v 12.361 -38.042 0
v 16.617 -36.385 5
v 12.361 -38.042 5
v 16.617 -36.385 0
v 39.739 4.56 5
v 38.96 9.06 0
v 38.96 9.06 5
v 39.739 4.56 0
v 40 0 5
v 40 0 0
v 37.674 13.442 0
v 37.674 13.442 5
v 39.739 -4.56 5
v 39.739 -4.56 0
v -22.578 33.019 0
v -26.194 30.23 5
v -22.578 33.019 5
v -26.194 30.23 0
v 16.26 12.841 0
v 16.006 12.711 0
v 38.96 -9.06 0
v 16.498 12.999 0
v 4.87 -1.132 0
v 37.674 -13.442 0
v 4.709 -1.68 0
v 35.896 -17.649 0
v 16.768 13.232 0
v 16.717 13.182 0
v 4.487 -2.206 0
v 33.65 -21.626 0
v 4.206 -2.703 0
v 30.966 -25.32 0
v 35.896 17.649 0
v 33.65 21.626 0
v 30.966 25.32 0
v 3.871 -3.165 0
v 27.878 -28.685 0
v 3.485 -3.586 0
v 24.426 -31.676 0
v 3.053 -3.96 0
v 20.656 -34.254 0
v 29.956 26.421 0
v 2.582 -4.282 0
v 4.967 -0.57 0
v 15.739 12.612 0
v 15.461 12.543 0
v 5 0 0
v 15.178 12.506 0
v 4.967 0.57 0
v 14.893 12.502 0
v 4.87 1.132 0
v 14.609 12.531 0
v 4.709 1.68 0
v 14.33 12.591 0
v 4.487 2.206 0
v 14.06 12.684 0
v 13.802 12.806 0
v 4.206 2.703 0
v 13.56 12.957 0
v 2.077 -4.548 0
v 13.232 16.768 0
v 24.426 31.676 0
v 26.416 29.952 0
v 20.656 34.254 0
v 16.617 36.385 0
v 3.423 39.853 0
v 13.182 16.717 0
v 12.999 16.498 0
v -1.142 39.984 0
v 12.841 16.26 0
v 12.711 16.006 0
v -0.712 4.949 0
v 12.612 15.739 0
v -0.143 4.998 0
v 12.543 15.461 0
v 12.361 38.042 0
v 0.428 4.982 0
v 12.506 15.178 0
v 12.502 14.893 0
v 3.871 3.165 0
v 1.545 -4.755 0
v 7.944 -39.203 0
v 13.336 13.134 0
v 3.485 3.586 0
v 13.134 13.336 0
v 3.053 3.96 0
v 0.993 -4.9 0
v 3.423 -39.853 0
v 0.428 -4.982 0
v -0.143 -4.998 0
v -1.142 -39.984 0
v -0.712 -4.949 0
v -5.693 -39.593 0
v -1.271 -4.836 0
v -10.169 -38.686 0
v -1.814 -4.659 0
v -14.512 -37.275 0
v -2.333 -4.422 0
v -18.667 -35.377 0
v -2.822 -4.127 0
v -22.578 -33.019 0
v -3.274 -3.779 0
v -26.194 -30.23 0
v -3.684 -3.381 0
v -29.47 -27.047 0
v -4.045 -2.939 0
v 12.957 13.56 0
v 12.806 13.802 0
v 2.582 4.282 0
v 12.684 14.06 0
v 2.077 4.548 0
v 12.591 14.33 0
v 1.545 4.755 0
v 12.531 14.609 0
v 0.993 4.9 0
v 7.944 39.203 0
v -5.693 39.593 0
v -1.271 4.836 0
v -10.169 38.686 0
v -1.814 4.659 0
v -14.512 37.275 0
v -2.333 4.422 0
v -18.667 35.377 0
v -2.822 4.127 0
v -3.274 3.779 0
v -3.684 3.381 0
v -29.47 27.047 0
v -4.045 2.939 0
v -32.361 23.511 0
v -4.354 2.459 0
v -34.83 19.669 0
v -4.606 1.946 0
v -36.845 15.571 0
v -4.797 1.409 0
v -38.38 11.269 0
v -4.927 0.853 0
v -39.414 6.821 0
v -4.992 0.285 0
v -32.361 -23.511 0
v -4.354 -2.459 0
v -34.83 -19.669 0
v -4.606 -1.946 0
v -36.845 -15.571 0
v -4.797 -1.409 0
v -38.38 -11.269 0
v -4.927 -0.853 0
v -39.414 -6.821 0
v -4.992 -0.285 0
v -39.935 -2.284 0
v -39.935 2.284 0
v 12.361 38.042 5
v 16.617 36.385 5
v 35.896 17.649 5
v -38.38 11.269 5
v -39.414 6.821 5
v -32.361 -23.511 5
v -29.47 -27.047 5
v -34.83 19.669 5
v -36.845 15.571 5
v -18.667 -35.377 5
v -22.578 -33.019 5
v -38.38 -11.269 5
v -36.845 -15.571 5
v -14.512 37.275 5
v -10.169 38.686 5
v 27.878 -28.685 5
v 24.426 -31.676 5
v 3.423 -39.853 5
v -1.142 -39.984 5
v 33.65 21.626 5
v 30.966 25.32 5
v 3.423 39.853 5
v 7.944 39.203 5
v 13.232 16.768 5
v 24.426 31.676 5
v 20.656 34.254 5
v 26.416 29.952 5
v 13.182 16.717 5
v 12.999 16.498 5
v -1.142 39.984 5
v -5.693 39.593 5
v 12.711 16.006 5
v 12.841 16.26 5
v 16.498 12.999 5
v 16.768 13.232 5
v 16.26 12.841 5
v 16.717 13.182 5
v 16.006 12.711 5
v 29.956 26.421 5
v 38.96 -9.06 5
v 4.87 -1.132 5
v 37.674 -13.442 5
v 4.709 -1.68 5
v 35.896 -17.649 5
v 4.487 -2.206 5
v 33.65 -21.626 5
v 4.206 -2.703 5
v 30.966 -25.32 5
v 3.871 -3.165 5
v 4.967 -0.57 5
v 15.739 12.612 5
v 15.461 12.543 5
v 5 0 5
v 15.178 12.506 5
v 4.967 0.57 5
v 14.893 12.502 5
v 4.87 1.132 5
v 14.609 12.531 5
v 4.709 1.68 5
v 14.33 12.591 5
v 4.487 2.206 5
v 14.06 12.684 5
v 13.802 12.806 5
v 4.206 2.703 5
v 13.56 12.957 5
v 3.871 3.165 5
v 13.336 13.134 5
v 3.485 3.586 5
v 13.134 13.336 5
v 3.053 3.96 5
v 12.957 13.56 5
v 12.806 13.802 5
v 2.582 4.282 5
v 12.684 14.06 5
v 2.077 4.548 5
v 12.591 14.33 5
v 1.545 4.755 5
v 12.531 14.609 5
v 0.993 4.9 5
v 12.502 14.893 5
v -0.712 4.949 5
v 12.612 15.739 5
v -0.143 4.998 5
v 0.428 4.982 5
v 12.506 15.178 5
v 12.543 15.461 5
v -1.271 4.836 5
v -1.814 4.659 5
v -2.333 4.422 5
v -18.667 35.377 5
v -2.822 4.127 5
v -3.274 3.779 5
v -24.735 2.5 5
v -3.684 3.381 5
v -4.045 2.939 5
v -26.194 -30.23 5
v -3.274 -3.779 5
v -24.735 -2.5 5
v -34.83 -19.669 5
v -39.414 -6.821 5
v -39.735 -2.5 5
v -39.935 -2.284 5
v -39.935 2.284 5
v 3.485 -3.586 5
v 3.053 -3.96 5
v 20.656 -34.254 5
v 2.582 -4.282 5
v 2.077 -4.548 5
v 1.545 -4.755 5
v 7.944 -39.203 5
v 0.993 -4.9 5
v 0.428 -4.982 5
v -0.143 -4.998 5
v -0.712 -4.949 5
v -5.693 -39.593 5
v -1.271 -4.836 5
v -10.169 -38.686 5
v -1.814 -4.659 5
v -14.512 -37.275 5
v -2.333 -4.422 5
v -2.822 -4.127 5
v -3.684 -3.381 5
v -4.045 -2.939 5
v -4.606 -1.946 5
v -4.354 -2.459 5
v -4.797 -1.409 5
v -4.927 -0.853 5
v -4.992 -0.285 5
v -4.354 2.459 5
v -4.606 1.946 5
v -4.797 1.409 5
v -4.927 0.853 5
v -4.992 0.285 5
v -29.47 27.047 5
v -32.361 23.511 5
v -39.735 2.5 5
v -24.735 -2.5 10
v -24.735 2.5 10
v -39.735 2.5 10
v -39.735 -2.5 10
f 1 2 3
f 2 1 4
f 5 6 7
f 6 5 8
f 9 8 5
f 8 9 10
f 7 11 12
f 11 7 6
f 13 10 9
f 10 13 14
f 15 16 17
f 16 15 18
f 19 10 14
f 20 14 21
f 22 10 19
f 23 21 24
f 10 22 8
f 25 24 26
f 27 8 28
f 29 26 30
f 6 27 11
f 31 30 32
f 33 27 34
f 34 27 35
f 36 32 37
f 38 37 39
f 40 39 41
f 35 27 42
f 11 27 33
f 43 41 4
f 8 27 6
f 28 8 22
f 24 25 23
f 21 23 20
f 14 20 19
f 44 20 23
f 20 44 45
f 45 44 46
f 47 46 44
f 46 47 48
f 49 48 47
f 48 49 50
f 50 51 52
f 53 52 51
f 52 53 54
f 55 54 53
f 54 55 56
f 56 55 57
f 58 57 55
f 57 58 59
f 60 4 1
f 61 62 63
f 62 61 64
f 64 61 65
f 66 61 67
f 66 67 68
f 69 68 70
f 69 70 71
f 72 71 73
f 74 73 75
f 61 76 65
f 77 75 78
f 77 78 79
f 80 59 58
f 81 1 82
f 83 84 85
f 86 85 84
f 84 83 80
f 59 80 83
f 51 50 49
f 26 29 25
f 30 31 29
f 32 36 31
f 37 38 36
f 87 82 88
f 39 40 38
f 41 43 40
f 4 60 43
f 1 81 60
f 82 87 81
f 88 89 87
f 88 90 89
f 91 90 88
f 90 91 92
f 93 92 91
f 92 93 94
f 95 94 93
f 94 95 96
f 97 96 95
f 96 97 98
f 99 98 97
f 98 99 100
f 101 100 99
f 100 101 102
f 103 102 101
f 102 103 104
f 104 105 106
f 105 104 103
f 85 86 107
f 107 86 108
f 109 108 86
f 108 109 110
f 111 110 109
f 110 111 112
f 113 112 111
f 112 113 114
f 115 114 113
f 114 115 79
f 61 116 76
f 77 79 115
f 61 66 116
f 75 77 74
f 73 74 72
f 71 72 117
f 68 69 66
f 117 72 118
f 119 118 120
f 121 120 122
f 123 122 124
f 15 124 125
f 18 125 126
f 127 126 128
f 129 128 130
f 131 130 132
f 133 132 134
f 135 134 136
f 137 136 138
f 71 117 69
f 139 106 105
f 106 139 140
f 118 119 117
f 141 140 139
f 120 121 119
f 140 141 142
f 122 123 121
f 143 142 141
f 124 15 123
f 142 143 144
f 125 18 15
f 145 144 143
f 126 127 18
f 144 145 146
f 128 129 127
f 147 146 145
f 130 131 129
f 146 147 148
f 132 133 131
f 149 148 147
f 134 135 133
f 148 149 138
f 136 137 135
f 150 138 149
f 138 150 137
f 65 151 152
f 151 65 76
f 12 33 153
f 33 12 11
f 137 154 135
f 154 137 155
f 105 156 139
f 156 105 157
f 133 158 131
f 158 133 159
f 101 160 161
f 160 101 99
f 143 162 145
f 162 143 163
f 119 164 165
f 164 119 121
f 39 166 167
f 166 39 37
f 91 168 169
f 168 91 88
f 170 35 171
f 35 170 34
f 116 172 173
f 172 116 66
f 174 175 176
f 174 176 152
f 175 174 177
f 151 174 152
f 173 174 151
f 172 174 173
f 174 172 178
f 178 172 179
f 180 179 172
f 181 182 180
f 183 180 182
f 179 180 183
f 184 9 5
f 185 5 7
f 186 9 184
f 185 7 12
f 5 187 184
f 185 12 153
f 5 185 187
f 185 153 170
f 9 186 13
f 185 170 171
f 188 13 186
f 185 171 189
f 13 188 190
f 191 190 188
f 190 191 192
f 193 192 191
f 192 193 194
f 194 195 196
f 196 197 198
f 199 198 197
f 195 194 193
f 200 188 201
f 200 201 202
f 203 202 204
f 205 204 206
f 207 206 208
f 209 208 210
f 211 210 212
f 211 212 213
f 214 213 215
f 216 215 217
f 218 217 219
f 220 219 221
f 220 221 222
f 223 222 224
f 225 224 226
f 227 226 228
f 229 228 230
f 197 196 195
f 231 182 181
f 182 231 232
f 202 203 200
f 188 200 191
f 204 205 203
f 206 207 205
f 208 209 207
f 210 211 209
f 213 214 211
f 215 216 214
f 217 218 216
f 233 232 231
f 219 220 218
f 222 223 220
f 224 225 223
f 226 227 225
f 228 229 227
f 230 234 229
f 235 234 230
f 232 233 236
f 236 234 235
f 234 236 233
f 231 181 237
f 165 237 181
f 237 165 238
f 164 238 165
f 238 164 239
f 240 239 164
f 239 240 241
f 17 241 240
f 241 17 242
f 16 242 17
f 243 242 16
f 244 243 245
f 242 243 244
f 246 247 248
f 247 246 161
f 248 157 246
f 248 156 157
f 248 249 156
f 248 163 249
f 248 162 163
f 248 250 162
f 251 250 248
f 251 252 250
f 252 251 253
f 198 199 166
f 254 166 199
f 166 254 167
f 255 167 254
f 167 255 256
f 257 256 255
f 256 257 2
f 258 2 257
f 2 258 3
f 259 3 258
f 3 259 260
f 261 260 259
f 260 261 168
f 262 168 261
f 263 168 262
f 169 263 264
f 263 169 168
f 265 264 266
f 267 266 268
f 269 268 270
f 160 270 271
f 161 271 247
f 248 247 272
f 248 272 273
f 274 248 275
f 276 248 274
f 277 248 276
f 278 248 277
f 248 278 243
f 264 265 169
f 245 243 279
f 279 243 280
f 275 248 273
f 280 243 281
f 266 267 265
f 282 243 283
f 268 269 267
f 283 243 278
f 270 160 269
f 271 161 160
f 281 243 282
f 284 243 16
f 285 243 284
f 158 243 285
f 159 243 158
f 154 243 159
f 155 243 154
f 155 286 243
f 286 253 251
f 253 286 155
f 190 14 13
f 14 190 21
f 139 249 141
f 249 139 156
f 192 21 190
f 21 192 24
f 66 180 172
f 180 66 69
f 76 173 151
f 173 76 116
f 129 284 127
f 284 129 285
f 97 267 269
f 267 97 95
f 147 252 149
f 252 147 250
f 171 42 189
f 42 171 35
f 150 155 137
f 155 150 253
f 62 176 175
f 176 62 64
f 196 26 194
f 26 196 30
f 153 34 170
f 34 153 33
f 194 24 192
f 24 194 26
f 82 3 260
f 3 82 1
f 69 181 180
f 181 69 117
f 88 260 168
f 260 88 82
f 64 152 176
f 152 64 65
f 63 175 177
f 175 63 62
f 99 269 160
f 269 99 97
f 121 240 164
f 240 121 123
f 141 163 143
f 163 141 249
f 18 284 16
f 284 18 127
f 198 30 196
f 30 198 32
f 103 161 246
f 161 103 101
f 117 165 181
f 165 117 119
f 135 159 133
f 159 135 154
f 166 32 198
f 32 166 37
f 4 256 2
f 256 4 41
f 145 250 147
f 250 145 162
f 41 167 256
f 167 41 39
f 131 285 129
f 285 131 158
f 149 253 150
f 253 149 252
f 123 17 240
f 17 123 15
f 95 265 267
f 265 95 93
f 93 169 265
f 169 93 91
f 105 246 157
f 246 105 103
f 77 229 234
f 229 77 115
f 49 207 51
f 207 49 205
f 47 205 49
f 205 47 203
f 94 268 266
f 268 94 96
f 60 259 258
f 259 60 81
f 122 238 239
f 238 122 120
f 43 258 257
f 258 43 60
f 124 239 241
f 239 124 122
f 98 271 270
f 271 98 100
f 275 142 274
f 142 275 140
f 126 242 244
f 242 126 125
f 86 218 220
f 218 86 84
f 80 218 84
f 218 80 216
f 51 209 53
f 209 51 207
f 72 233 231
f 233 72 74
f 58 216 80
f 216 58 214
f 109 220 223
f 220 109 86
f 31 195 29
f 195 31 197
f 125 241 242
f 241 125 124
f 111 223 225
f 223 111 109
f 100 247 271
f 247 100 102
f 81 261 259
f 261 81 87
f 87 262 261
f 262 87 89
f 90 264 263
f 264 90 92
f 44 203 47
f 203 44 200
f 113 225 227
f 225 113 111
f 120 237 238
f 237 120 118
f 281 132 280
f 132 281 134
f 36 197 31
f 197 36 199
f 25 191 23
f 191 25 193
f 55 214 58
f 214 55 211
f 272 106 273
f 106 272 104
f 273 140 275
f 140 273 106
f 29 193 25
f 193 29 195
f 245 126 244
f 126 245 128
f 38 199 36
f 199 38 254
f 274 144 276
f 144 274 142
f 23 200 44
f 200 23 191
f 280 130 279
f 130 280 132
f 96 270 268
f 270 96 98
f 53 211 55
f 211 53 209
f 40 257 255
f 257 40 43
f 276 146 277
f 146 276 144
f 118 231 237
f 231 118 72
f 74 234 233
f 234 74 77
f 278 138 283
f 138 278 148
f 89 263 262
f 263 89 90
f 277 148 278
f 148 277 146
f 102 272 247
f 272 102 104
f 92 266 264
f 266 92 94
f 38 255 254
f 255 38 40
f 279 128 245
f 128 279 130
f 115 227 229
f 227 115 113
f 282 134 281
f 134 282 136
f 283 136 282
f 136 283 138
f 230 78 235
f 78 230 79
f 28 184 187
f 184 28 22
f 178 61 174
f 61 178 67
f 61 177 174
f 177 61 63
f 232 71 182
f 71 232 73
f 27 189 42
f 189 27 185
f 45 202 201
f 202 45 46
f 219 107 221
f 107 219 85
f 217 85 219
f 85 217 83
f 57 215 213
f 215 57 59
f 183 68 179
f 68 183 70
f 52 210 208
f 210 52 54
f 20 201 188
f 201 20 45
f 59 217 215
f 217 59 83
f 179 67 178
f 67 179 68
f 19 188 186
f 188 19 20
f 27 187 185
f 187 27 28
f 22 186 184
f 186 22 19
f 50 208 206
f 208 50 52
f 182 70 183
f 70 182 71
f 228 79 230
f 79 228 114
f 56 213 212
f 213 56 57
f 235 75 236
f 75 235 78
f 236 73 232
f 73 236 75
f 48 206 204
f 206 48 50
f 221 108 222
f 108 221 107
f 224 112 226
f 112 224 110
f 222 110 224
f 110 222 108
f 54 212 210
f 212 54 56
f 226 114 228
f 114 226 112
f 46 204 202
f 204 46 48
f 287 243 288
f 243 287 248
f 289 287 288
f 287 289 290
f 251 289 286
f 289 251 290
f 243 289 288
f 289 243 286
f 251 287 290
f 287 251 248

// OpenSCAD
$fn=55;
module rearRotor() {
	union() {
		difference() {
			cylinder(h=5, r=40);
			cylinder(h=5, r=5);
			translate([15,15,0]) {
				rotate([0,0,45]) {
					hull() {
						translate([0,-2.5,0]) {
							cube([20,5,5]);
						}
						cylinder(h=5, r=2.5);
					}
				}
			}
		}
		translate([-39.735,-2.5,0]) {
			cube([15,5,10]);
		}
	}
}

rearRotor();
